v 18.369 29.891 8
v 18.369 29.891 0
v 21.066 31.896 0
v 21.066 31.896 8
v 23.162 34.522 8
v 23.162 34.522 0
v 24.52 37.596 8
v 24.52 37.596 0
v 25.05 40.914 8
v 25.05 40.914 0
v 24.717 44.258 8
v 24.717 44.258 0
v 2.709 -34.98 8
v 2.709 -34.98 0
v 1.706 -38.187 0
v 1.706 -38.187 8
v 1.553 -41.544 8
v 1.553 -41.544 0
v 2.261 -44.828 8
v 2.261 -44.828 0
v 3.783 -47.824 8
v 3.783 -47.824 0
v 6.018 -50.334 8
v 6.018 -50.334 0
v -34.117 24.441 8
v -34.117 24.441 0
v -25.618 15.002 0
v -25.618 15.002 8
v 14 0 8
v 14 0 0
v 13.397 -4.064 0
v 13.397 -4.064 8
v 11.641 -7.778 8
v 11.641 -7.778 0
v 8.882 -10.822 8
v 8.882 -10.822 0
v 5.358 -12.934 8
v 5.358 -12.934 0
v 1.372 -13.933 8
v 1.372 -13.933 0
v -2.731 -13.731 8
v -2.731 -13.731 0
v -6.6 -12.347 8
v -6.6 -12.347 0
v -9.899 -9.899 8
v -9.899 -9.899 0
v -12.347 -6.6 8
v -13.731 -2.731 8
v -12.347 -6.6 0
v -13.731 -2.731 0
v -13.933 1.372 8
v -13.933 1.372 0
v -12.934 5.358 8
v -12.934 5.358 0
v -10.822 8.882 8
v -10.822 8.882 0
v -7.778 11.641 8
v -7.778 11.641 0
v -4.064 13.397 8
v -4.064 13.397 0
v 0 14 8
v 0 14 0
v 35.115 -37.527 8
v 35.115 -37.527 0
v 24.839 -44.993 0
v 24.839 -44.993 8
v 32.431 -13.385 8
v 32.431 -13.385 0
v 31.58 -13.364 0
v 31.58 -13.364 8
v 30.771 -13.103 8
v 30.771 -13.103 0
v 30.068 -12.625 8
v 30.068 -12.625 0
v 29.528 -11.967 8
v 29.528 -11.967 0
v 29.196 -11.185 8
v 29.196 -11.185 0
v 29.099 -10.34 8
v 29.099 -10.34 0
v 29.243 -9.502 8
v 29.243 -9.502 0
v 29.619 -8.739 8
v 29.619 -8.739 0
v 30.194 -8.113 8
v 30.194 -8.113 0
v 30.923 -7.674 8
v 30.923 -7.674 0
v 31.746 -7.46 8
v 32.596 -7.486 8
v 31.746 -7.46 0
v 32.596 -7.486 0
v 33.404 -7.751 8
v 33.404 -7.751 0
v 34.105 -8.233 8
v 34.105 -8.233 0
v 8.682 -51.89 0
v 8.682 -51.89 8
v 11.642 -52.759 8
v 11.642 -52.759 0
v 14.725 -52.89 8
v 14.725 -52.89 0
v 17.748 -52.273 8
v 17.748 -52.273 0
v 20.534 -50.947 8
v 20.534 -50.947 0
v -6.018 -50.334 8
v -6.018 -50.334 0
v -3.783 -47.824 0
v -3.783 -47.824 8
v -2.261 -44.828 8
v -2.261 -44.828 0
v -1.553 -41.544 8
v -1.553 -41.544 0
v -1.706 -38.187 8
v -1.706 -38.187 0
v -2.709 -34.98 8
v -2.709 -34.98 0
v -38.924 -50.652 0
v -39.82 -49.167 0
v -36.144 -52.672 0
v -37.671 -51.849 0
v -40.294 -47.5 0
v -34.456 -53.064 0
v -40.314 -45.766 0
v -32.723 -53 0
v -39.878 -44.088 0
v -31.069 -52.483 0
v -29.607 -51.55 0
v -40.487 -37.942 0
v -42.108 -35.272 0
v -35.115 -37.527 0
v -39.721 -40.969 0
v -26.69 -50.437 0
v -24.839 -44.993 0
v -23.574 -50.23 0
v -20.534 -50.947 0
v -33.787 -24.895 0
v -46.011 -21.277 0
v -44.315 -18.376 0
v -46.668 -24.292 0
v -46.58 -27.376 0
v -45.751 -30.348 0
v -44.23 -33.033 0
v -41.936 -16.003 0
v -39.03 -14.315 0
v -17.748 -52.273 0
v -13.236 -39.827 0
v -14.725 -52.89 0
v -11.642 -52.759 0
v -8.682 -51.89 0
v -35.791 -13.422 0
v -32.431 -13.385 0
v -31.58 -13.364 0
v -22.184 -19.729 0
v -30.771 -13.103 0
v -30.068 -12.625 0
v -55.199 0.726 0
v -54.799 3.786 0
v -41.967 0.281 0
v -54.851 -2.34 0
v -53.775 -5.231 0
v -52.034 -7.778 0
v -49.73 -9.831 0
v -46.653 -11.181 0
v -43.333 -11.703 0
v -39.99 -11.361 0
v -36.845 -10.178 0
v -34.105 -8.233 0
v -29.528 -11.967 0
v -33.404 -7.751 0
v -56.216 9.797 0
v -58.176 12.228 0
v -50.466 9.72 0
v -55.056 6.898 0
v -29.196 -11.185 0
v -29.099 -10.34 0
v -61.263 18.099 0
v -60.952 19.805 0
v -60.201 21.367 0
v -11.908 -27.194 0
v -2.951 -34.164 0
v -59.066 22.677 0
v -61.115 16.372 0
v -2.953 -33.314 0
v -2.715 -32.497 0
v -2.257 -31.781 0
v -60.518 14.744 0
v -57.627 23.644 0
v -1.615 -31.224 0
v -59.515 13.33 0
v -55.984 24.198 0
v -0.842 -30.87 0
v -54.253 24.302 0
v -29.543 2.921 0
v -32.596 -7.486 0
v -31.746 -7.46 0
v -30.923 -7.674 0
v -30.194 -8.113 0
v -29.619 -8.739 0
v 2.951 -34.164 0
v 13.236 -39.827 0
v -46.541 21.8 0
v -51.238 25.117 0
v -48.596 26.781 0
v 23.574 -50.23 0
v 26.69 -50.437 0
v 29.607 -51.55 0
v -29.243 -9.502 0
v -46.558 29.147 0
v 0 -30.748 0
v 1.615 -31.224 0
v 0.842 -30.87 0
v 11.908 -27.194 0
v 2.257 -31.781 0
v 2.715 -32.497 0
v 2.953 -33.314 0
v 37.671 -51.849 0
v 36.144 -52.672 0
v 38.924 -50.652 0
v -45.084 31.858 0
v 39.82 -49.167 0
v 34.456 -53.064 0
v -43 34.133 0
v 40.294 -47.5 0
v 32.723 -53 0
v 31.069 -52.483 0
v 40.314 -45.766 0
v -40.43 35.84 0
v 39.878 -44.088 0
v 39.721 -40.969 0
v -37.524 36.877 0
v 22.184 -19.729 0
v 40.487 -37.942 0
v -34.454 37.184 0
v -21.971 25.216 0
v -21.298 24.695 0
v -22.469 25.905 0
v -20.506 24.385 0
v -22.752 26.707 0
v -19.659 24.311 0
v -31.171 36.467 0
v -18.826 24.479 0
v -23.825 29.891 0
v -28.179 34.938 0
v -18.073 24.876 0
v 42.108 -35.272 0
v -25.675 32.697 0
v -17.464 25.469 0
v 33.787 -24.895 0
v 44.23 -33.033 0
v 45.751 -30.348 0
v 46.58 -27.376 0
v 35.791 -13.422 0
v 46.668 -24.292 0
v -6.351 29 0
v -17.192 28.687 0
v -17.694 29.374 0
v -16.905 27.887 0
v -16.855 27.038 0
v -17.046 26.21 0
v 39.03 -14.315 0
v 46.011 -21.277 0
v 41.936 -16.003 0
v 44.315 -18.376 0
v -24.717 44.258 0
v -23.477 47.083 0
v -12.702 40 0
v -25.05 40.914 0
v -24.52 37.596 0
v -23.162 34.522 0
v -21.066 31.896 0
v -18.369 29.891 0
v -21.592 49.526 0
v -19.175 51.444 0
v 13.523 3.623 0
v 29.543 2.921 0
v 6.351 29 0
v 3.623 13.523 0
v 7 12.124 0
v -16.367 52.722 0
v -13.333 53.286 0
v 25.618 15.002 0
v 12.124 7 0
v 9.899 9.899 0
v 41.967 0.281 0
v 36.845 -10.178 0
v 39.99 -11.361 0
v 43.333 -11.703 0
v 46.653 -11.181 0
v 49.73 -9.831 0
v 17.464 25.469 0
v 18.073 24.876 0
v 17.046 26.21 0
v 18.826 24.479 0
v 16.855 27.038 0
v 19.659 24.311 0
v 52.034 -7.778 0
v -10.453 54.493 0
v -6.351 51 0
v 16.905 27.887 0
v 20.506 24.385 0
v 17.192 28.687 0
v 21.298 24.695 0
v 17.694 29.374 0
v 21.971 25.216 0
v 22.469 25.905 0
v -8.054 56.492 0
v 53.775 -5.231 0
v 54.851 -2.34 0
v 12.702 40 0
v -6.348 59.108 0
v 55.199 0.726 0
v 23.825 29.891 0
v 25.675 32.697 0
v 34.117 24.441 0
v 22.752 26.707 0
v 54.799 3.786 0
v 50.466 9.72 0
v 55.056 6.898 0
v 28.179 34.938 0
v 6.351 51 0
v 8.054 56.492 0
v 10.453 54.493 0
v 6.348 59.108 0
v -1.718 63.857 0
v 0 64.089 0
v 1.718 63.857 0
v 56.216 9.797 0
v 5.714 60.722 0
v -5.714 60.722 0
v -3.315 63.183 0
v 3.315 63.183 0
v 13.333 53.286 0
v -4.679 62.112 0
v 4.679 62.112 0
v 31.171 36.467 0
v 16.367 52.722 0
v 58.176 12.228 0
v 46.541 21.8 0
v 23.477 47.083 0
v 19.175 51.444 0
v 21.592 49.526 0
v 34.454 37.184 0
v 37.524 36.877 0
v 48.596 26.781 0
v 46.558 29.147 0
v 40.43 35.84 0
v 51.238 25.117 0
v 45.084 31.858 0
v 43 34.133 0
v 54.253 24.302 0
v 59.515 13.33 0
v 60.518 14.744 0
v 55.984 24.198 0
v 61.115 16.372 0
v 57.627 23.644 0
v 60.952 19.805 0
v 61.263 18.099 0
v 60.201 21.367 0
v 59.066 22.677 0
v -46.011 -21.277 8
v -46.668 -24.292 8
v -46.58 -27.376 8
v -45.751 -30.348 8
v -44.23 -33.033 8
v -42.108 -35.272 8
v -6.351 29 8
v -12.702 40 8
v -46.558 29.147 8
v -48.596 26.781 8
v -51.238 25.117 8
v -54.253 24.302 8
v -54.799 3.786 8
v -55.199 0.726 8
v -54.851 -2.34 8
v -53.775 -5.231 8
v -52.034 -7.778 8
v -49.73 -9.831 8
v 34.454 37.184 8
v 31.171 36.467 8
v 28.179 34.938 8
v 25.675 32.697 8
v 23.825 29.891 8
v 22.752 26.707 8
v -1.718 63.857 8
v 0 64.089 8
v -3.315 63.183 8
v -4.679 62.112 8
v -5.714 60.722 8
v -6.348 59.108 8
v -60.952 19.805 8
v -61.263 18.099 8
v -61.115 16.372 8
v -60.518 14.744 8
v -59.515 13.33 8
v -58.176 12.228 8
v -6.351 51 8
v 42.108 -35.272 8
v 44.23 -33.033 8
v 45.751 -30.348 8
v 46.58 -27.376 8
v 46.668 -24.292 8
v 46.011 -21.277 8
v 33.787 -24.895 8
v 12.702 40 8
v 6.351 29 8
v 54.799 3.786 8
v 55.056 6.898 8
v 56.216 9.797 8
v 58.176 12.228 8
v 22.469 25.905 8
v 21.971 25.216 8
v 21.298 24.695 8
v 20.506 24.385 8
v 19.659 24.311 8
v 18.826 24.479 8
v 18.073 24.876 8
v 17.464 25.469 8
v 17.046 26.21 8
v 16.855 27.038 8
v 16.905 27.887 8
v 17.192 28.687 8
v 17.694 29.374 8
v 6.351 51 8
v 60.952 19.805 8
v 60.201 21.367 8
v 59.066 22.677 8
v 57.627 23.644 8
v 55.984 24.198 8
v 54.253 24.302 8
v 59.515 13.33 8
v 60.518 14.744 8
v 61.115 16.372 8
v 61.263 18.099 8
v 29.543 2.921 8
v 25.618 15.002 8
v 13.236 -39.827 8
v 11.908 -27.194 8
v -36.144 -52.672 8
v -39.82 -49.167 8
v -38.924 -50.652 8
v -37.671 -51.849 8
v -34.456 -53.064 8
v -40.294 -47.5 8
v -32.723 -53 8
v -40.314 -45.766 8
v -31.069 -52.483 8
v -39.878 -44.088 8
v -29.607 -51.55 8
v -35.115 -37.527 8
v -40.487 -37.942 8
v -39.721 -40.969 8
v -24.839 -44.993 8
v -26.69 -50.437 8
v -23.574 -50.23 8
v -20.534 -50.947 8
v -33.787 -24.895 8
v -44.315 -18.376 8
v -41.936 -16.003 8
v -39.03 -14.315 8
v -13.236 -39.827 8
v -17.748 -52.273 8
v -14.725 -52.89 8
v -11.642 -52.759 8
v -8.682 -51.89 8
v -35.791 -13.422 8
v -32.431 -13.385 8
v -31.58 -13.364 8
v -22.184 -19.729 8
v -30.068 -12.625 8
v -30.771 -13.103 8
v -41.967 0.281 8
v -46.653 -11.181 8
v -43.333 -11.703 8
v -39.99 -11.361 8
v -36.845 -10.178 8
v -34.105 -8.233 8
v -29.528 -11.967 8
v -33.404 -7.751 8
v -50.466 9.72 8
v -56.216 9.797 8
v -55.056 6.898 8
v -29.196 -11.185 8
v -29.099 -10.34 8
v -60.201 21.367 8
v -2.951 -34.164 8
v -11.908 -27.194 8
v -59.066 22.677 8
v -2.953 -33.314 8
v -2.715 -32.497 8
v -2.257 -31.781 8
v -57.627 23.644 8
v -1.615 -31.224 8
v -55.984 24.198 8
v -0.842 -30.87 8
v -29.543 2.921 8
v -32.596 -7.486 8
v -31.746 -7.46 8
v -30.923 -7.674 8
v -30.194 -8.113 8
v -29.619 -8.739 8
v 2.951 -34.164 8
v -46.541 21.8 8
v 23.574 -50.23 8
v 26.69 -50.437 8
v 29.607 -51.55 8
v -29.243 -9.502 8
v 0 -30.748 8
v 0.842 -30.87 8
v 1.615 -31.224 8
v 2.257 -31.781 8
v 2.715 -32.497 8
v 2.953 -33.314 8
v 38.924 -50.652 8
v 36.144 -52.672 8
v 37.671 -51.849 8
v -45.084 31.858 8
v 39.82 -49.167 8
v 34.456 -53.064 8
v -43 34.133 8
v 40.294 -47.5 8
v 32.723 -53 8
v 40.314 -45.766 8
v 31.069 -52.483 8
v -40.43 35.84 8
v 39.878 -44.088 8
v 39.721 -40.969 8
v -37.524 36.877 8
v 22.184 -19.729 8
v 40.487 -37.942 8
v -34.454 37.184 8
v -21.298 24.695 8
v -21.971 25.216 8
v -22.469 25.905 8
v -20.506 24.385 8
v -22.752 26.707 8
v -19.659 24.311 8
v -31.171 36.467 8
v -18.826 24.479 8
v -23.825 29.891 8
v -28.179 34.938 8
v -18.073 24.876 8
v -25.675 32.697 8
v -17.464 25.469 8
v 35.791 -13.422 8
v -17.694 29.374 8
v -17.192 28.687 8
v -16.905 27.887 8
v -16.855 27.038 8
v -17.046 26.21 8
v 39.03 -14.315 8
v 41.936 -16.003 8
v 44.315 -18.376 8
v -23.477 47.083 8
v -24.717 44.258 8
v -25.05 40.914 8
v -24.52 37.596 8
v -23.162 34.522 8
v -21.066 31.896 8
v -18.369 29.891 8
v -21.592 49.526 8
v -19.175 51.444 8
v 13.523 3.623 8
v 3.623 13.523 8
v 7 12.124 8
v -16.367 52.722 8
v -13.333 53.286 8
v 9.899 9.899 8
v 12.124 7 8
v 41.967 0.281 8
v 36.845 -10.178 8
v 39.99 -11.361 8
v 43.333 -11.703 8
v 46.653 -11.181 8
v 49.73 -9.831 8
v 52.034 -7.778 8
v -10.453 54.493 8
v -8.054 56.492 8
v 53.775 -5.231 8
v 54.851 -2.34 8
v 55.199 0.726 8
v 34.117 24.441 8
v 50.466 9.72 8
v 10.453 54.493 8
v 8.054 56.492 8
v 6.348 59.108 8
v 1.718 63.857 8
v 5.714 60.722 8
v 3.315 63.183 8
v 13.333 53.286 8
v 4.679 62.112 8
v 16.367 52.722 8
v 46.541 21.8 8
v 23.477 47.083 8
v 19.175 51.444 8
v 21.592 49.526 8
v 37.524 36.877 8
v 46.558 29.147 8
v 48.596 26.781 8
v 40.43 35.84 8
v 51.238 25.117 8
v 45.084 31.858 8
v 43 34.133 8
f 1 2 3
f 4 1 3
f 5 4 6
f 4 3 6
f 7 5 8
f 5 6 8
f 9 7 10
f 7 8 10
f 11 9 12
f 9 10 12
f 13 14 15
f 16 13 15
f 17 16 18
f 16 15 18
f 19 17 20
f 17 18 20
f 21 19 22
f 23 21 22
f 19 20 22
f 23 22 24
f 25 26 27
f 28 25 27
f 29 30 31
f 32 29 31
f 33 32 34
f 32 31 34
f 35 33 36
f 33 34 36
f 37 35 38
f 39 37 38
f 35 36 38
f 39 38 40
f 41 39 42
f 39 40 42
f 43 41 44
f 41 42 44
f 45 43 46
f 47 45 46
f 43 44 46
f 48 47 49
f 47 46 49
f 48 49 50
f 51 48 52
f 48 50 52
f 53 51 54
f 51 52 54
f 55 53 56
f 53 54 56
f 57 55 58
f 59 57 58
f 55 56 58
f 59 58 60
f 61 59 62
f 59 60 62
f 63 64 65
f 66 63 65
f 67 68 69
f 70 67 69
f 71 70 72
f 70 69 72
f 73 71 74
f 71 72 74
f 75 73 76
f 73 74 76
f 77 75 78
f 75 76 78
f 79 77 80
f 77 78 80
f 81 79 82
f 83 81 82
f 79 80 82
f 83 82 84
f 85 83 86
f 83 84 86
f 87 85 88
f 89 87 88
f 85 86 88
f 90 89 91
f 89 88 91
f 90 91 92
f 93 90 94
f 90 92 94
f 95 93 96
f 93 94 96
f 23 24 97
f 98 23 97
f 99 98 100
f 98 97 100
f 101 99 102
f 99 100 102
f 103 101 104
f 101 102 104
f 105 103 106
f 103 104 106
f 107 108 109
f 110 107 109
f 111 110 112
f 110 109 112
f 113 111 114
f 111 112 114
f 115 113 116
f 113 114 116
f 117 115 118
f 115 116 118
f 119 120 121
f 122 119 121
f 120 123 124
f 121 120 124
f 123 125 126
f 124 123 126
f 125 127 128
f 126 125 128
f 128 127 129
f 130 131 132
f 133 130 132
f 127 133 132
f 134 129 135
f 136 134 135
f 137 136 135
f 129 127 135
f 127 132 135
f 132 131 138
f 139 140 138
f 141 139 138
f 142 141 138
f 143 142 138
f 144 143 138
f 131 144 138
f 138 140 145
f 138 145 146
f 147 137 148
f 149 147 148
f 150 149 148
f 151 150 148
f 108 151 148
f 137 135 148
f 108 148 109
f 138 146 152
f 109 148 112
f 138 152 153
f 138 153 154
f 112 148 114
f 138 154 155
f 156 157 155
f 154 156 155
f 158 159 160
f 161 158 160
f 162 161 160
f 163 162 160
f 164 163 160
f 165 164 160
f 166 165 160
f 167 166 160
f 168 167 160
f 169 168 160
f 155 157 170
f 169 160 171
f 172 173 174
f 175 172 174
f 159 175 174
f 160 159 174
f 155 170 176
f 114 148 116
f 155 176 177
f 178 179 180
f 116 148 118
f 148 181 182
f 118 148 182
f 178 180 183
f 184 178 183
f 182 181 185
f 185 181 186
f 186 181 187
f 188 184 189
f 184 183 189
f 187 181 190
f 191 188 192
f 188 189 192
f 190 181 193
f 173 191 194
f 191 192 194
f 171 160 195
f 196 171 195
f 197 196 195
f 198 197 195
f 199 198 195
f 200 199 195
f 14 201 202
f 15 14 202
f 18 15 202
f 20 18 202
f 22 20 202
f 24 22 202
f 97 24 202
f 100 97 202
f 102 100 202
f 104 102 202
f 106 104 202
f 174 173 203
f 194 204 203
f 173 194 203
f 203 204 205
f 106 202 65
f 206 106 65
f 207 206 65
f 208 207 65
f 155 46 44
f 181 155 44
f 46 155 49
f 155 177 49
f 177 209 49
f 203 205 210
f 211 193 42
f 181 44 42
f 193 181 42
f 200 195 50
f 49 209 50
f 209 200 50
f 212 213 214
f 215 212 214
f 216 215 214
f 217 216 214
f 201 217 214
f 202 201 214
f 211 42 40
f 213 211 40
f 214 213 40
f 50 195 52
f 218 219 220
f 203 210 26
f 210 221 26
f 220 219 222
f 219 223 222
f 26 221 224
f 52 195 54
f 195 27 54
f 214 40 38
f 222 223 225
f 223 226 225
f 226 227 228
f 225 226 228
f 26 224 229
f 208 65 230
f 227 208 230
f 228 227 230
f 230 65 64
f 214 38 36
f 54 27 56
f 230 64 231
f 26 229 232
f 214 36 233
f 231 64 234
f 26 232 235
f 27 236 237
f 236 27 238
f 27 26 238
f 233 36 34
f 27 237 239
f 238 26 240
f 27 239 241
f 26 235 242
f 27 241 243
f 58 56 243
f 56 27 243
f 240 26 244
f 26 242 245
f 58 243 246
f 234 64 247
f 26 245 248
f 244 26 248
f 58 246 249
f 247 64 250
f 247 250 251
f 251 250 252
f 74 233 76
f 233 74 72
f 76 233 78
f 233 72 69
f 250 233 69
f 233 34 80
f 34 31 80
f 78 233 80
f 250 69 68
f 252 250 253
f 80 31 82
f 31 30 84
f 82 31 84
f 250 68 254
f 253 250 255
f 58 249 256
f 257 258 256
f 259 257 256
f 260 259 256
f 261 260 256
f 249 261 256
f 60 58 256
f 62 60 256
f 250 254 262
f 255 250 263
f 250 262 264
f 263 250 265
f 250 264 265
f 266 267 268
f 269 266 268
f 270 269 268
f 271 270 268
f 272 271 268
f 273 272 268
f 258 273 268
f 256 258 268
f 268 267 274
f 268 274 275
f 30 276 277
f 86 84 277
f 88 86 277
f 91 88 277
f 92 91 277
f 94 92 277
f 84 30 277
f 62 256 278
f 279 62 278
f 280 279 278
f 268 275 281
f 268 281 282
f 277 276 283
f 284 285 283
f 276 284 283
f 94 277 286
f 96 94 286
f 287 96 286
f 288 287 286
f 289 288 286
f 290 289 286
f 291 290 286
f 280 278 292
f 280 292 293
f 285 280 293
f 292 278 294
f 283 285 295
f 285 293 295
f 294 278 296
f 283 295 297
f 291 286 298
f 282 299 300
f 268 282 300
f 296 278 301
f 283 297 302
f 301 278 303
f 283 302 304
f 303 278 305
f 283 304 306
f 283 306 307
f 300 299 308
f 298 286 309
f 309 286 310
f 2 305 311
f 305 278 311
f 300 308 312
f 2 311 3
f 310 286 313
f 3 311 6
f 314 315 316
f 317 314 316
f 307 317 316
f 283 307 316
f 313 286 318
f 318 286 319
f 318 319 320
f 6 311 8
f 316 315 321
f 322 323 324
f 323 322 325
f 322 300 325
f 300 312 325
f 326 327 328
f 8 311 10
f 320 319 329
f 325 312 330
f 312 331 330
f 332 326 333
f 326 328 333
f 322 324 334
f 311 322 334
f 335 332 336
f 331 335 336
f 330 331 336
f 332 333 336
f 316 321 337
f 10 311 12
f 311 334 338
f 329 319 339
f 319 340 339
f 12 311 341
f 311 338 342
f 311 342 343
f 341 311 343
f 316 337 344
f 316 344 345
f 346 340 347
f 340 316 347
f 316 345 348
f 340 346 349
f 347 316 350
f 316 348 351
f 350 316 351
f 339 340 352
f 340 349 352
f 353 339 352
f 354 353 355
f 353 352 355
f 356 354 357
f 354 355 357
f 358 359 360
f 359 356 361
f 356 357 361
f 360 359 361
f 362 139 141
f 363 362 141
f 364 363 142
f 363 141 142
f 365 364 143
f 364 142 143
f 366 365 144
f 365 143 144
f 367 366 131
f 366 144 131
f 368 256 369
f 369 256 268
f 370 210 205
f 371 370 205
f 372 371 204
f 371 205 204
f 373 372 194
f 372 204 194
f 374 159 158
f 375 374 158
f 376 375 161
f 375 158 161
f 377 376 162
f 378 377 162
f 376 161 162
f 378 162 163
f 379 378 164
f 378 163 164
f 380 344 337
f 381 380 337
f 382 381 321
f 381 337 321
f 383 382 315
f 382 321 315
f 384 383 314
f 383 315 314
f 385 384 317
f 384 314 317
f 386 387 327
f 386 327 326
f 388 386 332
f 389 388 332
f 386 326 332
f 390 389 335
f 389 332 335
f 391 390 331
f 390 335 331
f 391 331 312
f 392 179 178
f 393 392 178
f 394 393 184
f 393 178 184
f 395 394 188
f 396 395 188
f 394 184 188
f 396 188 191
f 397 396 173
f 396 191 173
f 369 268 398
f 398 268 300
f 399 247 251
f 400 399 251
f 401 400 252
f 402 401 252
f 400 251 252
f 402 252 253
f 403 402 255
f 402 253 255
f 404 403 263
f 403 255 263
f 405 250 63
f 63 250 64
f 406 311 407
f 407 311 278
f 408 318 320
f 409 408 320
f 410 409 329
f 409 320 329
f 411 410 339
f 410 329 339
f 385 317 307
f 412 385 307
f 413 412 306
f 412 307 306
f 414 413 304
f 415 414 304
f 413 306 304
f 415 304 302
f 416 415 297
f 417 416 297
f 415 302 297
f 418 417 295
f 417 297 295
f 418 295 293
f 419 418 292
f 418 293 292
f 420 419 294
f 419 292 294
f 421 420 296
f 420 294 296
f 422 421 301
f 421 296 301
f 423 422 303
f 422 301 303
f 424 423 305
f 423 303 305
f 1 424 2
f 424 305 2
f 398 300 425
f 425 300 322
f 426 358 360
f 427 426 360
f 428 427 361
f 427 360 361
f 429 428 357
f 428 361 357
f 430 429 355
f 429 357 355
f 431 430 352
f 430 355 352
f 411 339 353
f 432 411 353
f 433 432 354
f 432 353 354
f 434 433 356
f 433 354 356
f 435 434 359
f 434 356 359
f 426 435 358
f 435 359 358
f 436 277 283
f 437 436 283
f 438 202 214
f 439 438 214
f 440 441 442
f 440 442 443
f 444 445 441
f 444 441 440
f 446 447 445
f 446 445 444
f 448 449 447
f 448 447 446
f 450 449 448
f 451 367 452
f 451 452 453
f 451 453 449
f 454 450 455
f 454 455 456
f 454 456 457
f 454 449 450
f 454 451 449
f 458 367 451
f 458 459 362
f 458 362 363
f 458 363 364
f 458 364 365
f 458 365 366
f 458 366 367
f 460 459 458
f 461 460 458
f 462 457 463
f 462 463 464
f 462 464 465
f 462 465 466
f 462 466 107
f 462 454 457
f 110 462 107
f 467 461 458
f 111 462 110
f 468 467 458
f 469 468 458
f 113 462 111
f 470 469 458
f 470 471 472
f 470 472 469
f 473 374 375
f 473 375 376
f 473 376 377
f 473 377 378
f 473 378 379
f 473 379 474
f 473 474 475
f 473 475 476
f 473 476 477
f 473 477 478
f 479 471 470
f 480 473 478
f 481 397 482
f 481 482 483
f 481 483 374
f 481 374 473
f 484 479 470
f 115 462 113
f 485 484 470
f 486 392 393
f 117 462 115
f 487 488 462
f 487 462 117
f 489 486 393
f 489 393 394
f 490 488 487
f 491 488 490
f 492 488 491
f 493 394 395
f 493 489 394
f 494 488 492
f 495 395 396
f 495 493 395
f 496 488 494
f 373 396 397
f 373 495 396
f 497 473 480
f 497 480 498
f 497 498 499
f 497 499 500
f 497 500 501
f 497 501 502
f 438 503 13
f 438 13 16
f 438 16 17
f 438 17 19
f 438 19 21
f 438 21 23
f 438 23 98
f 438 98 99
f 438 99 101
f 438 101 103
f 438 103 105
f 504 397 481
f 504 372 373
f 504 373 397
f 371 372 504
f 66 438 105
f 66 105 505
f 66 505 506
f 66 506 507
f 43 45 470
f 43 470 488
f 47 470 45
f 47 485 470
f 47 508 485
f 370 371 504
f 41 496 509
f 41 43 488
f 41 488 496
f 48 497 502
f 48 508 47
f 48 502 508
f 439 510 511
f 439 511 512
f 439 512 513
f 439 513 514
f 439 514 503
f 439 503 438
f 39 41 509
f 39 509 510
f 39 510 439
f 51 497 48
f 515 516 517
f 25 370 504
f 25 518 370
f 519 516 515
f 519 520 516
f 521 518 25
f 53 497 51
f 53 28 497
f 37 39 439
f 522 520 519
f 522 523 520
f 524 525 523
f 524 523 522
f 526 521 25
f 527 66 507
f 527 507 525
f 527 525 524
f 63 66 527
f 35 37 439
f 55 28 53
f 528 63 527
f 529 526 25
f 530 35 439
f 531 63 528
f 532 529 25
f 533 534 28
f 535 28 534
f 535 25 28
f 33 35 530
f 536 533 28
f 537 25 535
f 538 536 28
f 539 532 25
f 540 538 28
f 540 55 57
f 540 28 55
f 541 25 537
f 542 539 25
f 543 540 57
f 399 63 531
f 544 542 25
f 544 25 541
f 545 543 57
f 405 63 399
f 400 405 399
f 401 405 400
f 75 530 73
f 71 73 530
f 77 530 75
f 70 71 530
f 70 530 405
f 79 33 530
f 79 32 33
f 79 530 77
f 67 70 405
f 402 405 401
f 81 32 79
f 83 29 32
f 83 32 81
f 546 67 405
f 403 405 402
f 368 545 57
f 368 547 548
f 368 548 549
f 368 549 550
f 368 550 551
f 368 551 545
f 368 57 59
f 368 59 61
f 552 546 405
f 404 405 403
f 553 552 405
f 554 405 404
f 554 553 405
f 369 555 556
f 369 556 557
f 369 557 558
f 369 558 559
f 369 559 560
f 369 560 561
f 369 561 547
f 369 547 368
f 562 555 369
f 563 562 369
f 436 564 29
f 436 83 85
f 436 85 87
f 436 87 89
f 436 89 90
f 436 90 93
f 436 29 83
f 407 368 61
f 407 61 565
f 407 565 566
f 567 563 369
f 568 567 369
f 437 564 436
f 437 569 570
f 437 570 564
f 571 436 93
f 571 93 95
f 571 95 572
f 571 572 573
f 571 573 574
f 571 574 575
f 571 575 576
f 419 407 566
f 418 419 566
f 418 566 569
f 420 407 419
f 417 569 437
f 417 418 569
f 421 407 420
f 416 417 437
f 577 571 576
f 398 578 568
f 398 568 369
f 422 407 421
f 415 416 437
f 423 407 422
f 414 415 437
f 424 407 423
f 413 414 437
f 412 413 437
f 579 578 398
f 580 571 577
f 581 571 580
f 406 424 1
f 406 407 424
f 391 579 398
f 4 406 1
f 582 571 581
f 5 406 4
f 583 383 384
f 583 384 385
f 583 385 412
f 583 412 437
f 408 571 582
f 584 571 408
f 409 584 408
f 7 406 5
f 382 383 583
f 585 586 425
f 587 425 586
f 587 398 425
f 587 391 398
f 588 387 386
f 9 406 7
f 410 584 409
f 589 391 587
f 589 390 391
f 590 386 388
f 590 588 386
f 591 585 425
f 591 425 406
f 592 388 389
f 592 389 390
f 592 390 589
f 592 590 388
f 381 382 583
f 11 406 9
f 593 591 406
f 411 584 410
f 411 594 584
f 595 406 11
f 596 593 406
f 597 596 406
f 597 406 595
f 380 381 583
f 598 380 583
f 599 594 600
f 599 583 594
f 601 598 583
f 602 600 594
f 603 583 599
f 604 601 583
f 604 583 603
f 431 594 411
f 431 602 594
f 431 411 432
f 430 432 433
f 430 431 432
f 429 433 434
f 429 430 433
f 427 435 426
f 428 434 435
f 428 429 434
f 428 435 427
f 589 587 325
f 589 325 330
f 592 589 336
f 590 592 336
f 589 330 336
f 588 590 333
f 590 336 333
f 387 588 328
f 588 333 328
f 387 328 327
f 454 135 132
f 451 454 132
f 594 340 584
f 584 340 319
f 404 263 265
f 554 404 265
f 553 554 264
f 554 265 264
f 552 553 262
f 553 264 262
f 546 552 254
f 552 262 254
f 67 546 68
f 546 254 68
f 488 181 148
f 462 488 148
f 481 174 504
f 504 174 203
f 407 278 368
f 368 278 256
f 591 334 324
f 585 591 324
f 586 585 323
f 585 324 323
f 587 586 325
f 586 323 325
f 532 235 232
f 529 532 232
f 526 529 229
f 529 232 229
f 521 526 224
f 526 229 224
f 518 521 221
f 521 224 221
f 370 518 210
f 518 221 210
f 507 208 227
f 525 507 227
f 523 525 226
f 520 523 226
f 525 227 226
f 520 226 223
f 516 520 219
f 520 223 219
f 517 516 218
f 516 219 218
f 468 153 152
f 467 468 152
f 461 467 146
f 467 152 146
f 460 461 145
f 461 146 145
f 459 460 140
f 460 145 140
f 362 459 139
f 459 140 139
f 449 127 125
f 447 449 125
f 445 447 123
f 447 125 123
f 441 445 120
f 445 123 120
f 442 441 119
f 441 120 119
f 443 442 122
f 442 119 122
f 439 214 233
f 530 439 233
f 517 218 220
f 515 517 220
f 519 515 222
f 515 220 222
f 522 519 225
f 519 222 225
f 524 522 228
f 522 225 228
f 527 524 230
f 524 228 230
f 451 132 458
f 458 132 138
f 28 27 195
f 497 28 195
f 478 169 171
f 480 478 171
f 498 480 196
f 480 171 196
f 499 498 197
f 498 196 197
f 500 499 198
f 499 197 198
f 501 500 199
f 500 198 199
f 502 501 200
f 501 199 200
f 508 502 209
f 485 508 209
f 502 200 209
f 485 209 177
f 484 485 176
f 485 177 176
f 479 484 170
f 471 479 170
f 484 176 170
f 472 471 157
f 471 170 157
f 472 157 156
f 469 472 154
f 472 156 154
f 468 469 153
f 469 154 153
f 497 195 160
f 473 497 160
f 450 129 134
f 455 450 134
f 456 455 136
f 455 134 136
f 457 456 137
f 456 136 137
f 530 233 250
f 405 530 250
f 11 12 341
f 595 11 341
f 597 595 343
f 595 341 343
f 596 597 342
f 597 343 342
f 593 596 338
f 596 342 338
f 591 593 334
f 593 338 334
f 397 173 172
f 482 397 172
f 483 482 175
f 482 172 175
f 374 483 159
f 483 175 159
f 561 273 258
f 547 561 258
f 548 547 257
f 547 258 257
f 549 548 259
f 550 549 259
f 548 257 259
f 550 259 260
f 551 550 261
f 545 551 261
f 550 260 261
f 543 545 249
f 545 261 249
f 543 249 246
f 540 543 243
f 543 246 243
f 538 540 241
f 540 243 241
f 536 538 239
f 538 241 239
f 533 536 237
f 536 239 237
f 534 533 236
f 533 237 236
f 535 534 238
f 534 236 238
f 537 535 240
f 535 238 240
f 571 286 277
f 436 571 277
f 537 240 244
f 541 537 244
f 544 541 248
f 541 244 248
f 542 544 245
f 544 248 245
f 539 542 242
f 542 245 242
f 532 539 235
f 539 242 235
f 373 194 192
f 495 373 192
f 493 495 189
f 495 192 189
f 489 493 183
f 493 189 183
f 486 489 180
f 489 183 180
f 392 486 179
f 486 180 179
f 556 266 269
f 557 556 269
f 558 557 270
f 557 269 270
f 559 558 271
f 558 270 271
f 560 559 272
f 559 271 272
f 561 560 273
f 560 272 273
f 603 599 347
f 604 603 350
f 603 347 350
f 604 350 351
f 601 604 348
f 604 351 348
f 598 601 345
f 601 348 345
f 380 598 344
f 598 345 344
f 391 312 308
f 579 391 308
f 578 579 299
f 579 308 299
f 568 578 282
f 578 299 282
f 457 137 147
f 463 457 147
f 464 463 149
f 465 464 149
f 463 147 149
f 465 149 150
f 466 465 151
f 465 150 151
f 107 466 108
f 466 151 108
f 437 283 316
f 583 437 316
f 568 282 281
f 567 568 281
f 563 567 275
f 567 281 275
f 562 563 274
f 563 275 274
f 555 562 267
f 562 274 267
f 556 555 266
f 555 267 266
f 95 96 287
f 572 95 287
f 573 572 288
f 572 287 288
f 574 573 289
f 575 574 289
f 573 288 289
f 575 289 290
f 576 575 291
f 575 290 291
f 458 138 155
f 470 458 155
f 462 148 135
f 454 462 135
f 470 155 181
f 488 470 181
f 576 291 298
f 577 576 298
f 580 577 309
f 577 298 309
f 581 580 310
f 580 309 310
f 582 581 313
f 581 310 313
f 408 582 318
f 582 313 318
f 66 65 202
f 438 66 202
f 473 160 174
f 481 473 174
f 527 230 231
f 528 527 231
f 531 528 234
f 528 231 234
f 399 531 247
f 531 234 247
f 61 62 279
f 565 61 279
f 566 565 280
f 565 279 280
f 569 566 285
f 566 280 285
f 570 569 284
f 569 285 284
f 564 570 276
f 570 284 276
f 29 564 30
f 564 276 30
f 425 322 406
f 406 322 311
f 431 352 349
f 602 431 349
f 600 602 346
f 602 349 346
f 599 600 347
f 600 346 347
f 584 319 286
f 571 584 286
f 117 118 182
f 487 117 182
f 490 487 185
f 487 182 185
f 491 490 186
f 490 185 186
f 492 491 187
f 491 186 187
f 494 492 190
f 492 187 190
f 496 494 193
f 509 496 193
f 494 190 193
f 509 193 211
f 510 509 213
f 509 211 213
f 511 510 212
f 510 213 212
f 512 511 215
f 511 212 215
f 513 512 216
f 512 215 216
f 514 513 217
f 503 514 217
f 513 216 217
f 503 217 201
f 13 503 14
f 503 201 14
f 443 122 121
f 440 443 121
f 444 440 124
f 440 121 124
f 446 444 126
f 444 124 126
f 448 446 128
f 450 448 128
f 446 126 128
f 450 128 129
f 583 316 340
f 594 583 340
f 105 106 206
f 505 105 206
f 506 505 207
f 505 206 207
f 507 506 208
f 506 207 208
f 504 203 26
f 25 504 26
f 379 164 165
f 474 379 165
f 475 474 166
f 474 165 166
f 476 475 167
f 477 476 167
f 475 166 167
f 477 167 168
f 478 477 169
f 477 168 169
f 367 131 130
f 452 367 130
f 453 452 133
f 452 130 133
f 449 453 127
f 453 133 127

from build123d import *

# Parameters (mm, degrees)
F1_DEPTH = 8


with BuildPart() as f1:
    # F0 (on Top) → F1 (new body)
    with BuildSketch(Plane.XY):
        with BuildLine():
            ThreePointArc((0, 14), (-9.899495, -9.899495), (14, 0))
            ThreePointArc((14, 0), (9.899495, 9.899495), (0, 14))
        make_face()
        with BuildLine():
            ThreePointArc((6.347522, 59.107844), (4.032635, 62.692937), (0, 64.089164))
            ThreePointArc((0, 64.089164), (-4.032635, 62.692937), (-6.347522, 59.107844))
            ThreePointArc((-6.347522, 59.107844), (-9.178693, 55.402974), (-13.333366, 53.286307))
            ThreePointArc((-13.333366, 53.286307), (-20.442135, 50.558658), (-24.717154, 44.257954))
            ThreePointArc((-24.717154, 44.257954), (-23.940515, 36.01526), (-18.369188, 29.891087))
            ThreePointArc((-18.369188, 29.891087), (-18.073469, 24.875996), (-22.751722, 26.70699))
            ThreePointArc((-22.751722, 26.70699), (-26.854522, 33.89811), (-34.453795, 37.18387))
            ThreePointArc((-34.453795, 37.18387), (-41.767174, 35.06511), (-46.558052, 29.147159))
            ThreePointArc((-46.558052, 29.147159), (-49.854987, 25.849917), (-54.253408, 24.302181))
            ThreePointArc((-54.253408, 24.302181), (-58.378374, 23.208447), (-60.952417, 19.804641))
            ThreePointArc((-60.952417, 19.804641), (-60.870679, 15.537919), (-58.176392, 12.228476))
            ThreePointArc((-58.176392, 12.228476), (-55.527732, 8.391005), (-54.798526, 3.785589))
            ThreePointArc((-54.798526, 3.785589), (-54.401108, -3.818141), (-49.729836, -9.830951))
            ThreePointArc((-49.729836, -9.830951), (-41.650573, -11.639455), (-34.104504, -8.233282))
            ThreePointArc((-34.104504, -8.233282), (-29.243487, -9.501785), (-32.430525, -13.38526))
            ThreePointArc((-32.430525, -13.38526), (-40.537522, -15.065076), (-46.01077, -21.277058))
            ThreePointArc((-46.01077, -21.277058), (-46.255668, -28.887228), (-42.107825, -35.272372))
            ThreePointArc((-42.107825, -35.272372), (-39.99077, -39.426847), (-39.877972, -44.08827))
            ThreePointArc((-39.877972, -44.08827), (-40.112455, -48.349328), (-37.670666, -51.849223))
            ThreePointArc((-37.670666, -51.849223), (-33.587513, -53.089975), (-29.607466, -51.55023))
            ThreePointArc((-29.607466, -51.55023), (-25.139332, -50.217048), (-20.533985, -50.946684))
            ThreePointArc((-20.533985, -50.946684), (-13.179599, -52.918399), (-6.017575, -50.333815))
            ThreePointArc((-6.017575, -50.333815), (-1.800955, -43.208839), (-2.708555, -34.979535))
            ThreePointArc((-2.708555, -34.979535), (0, -30.748422), (2.708555, -34.979535))
            ThreePointArc((2.708555, -34.979535), (1.800955, -43.208839), (6.017575, -50.333815))
            ThreePointArc((6.017575, -50.333815), (13.179599, -52.918399), (20.533985, -50.946684))
            ThreePointArc((20.533985, -50.946684), (25.139332, -50.217048), (29.607466, -51.55023))
            ThreePointArc((29.607466, -51.55023), (33.587513, -53.089975), (37.670666, -51.849223))
            ThreePointArc((37.670666, -51.849223), (40.112455, -48.349328), (39.877972, -44.08827))
            ThreePointArc((39.877972, -44.08827), (39.99077, -39.426847), (42.107825, -35.272372))
            ThreePointArc((42.107825, -35.272372), (46.255668, -28.887228), (46.01077, -21.277058))
            ThreePointArc((46.01077, -21.277058), (40.537522, -15.065076), (32.430525, -13.38526))
            ThreePointArc((32.430525, -13.38526), (29.243487, -9.501785), (34.104504, -8.233282))
            ThreePointArc((34.104504, -8.233282), (41.650573, -11.639455), (49.729836, -9.830951))
            ThreePointArc((49.729836, -9.830951), (54.401108, -3.818141), (54.798526, 3.785589))
            ThreePointArc((54.798526, 3.785589), (55.527732, 8.391005), (58.176392, 12.228476))
            ThreePointArc((58.176392, 12.228476), (60.870679, 15.537919), (60.952417, 19.804641))
            ThreePointArc((60.952417, 19.804641), (58.378374, 23.208447), (54.253408, 24.302181))
            ThreePointArc((54.253408, 24.302181), (49.854987, 25.849917), (46.558052, 29.147159))
            ThreePointArc((46.558052, 29.147159), (41.767174, 35.06511), (34.453795, 37.18387))
            ThreePointArc((34.453795, 37.18387), (26.854522, 33.89811), (22.751722, 26.70699))
            ThreePointArc((22.751722, 26.70699), (18.073469, 24.875996), (18.369188, 29.891087))
            ThreePointArc((18.369188, 29.891087), (23.940515, 36.01526), (24.717154, 44.257954))
            ThreePointArc((24.717154, 44.257954), (20.442135, 50.558658), (13.333366, 53.286307))
            ThreePointArc((13.333366, 53.286307), (9.178693, 55.402974), (6.347522, 59.107844))
        make_face()
        Polygon((-11.907824, -27.194431), (-13.235514, -39.826555), (-24.8391, -44.992804), (-35.114996, -37.526929), (-33.787306, -24.894804), (-22.18372, -19.728555), align=None, mode=Mode.SUBTRACT)
        with BuildLine():
            ThreePointArc((0, 14), (9.899495, 9.899495), (14, 0))
            ThreePointArc((14, 0), (-9.899495, -9.899495), (0, 14))
        make_face(mode=Mode.SUBTRACT)
        Polygon((22.18372, -19.728555), (33.787306, -24.894804), (35.114996, -37.526929), (24.8391, -44.992804), (13.235514, -39.826555), (11.907824, -27.194431), align=None, mode=Mode.SUBTRACT)
        Polygon((-29.54316, 2.921473), (-41.967304, 0.28064), (-50.466404, 9.719847), (-46.541361, 21.799887), (-34.117218, 24.44072), (-25.618117, 15.001513), align=None, mode=Mode.SUBTRACT)
        Polygon((6.350853, 29), (0, 29), (-6.350853, 29), (-12.701706, 40), (-6.350853, 51), (0, 51), (6.350853, 51), (12.701706, 40), align=None, mode=Mode.SUBTRACT)
        Polygon((25.618117, 15.001513), (34.117218, 24.44072), (46.541361, 21.799887), (50.466404, 9.719847), (41.967304, 0.28064), (29.54316, 2.921473), align=None, mode=Mode.SUBTRACT)
    extrude(amount=F1_DEPTH)


solid = f1.part
